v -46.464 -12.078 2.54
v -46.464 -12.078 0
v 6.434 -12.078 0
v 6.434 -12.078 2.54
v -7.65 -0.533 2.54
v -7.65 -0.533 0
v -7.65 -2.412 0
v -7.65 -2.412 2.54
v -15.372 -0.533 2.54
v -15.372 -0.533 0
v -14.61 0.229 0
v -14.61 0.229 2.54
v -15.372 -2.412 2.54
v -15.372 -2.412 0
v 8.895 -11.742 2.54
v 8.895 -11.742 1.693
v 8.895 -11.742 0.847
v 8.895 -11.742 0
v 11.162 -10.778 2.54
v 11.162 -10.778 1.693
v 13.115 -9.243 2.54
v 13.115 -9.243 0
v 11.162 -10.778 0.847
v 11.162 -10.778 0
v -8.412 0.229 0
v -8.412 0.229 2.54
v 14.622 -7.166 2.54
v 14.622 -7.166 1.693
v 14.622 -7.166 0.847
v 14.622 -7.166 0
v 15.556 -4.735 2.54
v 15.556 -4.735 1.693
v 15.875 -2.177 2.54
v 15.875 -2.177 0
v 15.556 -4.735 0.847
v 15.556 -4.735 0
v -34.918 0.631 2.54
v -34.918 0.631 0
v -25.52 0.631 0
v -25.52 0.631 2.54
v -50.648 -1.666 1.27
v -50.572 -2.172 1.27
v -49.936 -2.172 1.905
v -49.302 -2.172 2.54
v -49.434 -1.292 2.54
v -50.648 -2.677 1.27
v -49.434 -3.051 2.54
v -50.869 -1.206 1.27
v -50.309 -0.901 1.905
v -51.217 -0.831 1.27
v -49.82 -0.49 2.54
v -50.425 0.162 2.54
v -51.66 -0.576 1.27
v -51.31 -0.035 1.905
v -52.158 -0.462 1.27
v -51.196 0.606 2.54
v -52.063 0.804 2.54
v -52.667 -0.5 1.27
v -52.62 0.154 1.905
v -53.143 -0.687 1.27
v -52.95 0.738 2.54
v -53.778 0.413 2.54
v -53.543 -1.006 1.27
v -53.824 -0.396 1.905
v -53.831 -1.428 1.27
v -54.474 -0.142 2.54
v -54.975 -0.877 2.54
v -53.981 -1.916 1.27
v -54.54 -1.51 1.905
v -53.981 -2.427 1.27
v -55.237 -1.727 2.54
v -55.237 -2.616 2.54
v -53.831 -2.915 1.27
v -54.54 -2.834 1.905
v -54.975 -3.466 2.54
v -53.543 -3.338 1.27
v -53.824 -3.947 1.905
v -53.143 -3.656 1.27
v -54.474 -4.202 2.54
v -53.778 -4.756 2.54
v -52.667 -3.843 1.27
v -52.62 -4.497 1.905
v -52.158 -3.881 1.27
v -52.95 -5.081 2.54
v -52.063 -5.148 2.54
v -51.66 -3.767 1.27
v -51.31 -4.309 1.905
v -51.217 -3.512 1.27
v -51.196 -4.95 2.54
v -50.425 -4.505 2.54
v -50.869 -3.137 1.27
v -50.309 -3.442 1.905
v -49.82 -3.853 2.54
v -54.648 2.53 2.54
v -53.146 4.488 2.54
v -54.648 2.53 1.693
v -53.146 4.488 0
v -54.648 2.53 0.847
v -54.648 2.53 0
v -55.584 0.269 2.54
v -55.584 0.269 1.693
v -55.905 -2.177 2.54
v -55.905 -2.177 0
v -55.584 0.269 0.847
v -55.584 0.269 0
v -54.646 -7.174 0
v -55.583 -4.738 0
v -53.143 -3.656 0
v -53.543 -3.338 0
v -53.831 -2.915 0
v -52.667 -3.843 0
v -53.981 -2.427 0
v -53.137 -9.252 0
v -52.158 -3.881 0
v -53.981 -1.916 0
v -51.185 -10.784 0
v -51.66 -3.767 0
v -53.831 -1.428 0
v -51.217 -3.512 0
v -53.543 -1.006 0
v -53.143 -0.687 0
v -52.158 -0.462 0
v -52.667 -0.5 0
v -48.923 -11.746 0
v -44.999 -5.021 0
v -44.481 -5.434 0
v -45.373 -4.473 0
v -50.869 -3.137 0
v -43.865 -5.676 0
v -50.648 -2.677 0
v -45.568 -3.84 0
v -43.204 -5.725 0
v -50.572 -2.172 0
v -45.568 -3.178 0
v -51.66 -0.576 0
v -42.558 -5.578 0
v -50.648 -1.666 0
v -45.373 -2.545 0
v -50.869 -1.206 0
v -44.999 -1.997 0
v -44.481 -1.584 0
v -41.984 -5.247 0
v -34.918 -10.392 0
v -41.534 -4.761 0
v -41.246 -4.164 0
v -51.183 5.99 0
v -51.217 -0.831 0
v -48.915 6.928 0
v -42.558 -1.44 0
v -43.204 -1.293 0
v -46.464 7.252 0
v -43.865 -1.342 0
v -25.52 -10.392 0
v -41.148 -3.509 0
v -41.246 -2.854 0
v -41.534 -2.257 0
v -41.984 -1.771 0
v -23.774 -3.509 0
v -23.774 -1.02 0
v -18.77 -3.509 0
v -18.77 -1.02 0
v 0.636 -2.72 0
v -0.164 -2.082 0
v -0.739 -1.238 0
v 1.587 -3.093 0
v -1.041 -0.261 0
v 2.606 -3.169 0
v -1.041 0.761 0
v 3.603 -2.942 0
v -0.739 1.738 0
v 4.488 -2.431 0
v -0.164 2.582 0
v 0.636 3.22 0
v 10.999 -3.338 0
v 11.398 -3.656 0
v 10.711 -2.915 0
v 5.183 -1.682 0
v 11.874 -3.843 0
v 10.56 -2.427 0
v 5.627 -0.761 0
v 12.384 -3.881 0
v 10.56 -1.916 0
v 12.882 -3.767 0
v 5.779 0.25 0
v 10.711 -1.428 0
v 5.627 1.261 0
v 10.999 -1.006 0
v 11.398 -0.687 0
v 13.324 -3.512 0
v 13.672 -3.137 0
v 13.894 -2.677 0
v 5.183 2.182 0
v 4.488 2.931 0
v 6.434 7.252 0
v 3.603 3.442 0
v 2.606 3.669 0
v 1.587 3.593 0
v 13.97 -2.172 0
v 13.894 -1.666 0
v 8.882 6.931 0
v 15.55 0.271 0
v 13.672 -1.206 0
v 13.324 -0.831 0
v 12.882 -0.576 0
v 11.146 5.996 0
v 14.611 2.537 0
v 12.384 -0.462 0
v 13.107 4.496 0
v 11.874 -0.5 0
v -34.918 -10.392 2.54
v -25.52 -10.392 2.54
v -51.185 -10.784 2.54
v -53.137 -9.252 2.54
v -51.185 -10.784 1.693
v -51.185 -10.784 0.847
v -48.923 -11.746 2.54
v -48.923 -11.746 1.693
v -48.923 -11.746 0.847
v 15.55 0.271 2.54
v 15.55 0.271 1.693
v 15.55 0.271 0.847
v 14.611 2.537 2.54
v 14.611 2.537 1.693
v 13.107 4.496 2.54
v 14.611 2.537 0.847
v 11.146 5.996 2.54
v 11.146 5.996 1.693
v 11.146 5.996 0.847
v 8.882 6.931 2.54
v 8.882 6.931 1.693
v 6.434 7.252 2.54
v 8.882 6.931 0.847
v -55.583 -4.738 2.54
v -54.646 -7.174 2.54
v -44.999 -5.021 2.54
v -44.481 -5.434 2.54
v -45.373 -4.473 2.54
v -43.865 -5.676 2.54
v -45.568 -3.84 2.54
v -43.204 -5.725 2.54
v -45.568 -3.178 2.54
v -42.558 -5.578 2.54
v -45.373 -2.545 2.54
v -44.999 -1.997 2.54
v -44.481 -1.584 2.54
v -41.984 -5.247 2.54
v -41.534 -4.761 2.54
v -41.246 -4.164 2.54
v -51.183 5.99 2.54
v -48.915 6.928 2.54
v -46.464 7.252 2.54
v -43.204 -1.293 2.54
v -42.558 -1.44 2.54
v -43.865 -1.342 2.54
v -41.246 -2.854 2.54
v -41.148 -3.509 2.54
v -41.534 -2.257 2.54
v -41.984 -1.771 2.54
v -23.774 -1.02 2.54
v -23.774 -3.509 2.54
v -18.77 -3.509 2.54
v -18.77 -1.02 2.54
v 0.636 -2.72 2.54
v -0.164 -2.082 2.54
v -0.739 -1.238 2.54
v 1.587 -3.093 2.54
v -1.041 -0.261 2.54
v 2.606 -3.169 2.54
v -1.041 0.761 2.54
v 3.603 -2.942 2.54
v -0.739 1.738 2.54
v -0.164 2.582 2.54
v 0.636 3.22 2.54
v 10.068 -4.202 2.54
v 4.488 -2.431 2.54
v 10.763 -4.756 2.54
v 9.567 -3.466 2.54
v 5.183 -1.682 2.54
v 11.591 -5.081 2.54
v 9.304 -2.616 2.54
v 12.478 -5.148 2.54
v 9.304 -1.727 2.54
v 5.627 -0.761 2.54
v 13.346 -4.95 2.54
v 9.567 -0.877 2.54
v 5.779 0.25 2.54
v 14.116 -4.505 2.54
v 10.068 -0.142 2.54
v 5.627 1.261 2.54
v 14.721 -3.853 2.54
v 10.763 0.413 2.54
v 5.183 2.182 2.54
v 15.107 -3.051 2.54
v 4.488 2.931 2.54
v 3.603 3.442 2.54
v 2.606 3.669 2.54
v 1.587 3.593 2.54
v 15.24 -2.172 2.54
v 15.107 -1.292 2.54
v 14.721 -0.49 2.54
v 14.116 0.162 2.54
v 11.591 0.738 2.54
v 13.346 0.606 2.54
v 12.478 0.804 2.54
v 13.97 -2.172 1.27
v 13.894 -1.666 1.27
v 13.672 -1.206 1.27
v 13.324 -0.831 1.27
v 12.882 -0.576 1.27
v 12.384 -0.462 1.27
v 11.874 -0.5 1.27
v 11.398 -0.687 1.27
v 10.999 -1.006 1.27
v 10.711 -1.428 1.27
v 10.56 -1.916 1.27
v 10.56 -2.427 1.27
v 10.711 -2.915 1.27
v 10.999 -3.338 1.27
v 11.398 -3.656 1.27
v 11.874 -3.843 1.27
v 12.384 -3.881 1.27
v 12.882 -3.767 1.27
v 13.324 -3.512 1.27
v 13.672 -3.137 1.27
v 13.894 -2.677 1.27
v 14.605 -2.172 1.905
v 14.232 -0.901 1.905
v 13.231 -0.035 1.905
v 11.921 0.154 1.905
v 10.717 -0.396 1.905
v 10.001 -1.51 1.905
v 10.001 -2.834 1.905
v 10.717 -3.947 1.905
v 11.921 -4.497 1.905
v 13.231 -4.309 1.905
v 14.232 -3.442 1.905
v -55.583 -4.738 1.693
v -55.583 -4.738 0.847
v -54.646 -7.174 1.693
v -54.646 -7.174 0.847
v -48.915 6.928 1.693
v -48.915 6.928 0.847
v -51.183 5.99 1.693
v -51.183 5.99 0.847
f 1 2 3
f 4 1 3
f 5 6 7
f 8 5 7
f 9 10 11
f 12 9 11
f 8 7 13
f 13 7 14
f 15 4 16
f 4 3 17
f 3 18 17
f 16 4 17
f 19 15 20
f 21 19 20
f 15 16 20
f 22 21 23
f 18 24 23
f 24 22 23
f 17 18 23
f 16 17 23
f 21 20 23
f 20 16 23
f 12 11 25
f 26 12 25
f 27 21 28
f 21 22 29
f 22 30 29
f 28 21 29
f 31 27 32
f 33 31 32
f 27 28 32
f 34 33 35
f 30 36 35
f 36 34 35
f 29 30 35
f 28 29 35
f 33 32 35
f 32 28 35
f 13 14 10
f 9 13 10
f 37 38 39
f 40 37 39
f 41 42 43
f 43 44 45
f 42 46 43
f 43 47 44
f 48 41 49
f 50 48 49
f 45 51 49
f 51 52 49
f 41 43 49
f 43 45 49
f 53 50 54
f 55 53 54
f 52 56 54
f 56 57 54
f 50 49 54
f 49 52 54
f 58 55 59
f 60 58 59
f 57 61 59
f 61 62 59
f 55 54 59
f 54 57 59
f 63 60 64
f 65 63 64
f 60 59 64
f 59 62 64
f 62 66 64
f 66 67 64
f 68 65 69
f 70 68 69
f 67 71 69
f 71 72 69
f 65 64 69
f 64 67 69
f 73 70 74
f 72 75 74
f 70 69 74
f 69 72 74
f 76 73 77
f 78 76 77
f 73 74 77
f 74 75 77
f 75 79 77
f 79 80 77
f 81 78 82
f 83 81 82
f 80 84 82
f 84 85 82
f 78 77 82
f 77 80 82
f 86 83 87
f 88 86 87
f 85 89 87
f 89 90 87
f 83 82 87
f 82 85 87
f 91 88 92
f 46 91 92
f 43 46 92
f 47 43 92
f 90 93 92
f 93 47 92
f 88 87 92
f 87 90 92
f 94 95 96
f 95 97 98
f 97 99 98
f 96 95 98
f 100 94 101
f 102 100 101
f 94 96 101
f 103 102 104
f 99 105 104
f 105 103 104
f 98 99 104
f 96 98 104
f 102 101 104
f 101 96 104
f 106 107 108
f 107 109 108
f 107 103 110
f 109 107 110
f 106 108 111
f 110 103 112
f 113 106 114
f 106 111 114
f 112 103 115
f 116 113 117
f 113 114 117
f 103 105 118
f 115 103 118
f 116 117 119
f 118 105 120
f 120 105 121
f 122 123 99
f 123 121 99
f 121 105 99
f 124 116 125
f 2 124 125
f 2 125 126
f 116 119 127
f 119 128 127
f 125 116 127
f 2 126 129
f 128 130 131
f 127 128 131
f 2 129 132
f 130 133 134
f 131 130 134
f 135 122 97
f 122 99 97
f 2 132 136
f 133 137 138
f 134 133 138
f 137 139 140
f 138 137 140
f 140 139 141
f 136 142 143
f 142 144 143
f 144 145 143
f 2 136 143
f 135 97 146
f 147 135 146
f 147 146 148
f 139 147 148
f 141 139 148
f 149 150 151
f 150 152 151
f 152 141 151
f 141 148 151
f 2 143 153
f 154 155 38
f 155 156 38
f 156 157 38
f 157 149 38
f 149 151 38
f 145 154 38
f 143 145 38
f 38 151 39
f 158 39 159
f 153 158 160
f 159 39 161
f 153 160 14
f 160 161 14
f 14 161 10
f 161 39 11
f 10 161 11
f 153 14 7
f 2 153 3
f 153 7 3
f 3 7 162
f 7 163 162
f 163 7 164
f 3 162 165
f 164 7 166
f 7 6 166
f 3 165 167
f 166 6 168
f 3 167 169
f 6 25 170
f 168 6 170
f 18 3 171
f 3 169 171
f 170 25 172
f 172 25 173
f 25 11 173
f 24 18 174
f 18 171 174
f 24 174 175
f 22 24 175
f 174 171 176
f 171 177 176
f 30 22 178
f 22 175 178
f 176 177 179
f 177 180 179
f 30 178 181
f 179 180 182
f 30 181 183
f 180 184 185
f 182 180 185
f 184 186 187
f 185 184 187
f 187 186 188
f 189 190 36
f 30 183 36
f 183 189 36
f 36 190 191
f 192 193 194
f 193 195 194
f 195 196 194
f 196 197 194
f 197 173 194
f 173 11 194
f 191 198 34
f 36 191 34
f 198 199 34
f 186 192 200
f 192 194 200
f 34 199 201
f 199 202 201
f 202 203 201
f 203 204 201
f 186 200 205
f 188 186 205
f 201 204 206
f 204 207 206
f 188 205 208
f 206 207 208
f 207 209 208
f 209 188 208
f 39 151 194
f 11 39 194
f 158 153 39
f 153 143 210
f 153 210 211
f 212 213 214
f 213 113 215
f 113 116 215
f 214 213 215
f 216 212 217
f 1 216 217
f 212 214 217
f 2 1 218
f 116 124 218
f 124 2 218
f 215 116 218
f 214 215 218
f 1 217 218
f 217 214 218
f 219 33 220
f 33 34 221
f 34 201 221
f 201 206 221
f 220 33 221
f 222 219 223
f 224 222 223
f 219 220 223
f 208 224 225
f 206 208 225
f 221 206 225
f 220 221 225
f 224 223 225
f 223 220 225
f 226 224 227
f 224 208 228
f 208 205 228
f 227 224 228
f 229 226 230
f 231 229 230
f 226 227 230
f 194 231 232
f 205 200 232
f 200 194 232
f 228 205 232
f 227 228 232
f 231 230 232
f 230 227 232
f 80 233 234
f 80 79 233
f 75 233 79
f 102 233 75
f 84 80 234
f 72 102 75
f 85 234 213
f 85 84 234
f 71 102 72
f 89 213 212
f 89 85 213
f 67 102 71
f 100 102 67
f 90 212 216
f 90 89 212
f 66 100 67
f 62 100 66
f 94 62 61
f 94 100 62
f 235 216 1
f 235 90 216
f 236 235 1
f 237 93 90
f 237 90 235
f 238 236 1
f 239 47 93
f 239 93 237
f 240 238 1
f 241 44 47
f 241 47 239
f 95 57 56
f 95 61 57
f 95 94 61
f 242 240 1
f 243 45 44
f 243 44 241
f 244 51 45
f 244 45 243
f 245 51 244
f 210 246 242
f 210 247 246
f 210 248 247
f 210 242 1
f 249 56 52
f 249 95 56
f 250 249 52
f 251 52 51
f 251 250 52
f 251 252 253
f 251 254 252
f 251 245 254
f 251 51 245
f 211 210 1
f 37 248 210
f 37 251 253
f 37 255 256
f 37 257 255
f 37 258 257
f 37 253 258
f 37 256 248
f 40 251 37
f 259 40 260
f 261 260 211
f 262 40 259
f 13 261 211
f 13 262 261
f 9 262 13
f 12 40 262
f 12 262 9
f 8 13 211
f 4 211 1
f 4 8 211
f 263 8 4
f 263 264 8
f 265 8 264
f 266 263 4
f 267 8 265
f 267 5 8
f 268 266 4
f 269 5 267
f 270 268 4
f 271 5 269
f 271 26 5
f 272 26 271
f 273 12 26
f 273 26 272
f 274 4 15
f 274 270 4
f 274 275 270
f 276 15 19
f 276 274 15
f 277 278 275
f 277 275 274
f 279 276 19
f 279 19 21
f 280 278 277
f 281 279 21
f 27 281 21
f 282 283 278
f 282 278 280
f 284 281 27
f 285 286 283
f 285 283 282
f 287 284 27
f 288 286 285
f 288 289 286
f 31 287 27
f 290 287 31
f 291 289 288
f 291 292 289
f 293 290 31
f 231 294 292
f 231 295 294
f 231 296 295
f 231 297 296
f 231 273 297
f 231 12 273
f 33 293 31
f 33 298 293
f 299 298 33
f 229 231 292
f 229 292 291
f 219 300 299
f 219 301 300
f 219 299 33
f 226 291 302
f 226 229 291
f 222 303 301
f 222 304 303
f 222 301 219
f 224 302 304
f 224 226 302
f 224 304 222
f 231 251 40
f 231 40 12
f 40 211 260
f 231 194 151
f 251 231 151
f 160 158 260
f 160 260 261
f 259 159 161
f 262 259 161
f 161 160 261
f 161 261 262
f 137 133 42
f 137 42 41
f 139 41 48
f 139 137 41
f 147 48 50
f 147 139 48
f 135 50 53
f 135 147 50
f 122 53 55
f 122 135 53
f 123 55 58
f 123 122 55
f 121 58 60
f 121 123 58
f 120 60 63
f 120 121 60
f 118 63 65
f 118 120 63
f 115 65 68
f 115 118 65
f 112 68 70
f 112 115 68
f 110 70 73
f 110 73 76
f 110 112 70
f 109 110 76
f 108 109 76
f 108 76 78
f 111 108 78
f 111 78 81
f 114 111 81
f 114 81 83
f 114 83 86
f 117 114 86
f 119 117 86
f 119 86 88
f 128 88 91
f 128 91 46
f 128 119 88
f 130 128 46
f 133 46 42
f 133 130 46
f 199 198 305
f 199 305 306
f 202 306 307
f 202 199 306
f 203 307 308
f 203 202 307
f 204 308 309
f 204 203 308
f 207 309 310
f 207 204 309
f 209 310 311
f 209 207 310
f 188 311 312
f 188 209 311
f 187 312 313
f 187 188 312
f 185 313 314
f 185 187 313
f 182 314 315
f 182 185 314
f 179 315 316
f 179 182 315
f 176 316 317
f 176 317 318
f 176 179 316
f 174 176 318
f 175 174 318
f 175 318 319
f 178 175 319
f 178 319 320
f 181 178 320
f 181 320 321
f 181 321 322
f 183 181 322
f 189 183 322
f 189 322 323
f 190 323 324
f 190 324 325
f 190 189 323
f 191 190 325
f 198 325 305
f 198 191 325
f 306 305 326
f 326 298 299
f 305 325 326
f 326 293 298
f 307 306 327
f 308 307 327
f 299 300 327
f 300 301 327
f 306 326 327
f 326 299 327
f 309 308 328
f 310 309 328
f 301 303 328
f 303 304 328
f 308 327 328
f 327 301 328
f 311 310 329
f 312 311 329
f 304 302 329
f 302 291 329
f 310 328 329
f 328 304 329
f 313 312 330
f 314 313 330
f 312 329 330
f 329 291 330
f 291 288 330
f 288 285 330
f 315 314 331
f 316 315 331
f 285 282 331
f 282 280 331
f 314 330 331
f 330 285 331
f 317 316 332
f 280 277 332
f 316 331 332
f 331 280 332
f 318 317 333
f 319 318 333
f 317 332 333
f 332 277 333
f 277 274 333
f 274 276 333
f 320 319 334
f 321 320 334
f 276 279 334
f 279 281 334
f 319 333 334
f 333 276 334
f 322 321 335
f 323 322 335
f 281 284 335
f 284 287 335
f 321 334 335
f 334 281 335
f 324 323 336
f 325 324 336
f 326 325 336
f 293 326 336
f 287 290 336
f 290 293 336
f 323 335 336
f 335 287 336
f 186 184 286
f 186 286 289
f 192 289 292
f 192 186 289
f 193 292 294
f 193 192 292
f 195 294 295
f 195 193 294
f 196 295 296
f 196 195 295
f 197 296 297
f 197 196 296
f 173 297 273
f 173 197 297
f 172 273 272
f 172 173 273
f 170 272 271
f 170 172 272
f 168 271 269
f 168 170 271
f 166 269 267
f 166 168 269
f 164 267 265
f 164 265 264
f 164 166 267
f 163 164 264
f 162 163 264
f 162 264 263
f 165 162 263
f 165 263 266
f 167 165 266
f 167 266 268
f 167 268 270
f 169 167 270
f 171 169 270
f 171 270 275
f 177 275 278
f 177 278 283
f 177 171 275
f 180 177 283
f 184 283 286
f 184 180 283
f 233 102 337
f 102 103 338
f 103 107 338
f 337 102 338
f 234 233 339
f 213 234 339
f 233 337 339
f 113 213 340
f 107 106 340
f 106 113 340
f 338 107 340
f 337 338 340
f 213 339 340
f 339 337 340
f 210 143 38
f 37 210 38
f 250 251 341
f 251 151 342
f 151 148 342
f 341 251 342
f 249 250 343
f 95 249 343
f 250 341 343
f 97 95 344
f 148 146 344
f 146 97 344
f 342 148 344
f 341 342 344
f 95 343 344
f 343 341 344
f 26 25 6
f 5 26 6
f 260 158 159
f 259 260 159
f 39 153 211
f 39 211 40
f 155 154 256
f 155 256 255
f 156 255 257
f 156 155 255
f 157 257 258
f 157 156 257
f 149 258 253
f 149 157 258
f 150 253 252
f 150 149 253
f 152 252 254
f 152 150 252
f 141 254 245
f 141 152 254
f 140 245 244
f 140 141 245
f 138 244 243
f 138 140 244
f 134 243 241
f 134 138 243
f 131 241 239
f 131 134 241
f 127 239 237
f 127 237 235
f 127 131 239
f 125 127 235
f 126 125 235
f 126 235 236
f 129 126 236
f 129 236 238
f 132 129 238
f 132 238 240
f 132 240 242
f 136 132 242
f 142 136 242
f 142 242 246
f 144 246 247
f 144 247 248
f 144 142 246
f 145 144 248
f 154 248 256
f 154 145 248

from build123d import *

# Parameters (mm, degrees)
SKETCH1_R           = 3.4289
SKETCH1_R_2         = 1.7144
SKETCH1_R_3         = 2.2226
SKETCH1_W           = 9.398
SKETCH1_H           = 11.0235
SKETCH1_W_2         = 5.0037
SKETCH1_H_2         = 2.4891
BOSS_EXTRUDE1_DEPTH = 2.54
CHAMFER1_SIZE       = 1.27


with BuildPart() as part:
    # Sketch1 → Boss-Extrude1 (new body)
    with BuildSketch(Plane.XY):
        with BuildLine():
            Line((6.434, 7.2517), (-46.4644, 7.2517))
            add(Edge.make_bspline(
                [(-46.4644, 7.2517), (-48.9654, 7.2501), (-51.3771, 6.2567), (-53.1462, 4.4876)],
                knots=[0.3, 0.3, 0.3, 0.3, 0.4, 0.4, 0.4, 0.4], degree=3))
            add(Edge.make_bspline(
                [(-53.1462, 4.4876), (-54.9139, 2.7201), (-55.907, 0.3228), (-55.9054, -2.1769)],
                knots=[0.4, 0.4, 0.4, 0.4, 0.5, 0.5, 0.5, 0.5], degree=3))
            add(Edge.make_bspline(
                [(-55.9054, -2.1769), (-55.9039, -4.7242), (-54.9188, -7.4291), (-53.137, -9.2518)],
                knots=[0.5, 0.5, 0.5, 0.5, 0.6, 0.6, 0.6, 0.6], degree=3))
            add(Edge.make_bspline(
                [(-53.137, -9.2518), (-51.3786, -11.0507), (-48.9824, -12.0793), (-46.4644, -12.0777)],
                knots=[0.6, 0.6, 0.6, 0.6, 0.7, 0.7, 0.7, 0.7], degree=3))
            Line((-46.4644, -12.0777), (6.434, -12.0777))
            add(Edge.make_bspline(
                [(6.434, -12.0777), (8.9516, -12.0761), (11.3581, -11.0449), (13.1151, -9.2429)],
                knots=[0.8, 0.8, 0.8, 0.8, 0.9, 0.9, 0.9, 0.9], degree=3))
            add(Edge.make_bspline(
                [(13.1151, -9.2429), (14.8954, -7.4173), (15.8766, -4.7239), (15.875, -2.1771)],
                knots=[0.9, 0.9, 0.9, 0.9, 1, 1, 1, 1], degree=3))
            add(Edge.make_bspline(
                [(15.875, -2.1771), (15.8735, 0.3223), (14.8775, 2.7305), (13.1074, 4.496)],
                knots=[0, 0, 0, 0, 0.1, 0.1, 0.1, 0.1], degree=3))
            add(Edge.make_bspline(
                [(13.1074, 4.496), (11.3364, 6.2625), (8.9354, 7.2533), (6.434, 7.2517)],
                knots=[0.1, 0.1, 0.1, 0.1, 0.2, 0.2, 0.2, 0.2], degree=3))
        make_face()
        with Locations((2.35, 0.25)):
            Circle(SKETCH1_R, mode=Mode.SUBTRACT)
        with Locations((12.2554, -2.1716)):
            Circle(SKETCH1_R_2, mode=Mode.SUBTRACT)
        with Locations((-43.3701, -3.5091)):
            Circle(SKETCH1_R_3, mode=Mode.SUBTRACT)
        with Locations((-52.2859, -2.1716)):
            Circle(SKETCH1_R_2, mode=Mode.SUBTRACT)
        with Locations((-30.2191, -4.88075)):
            Rectangle(SKETCH1_W, SKETCH1_H, mode=Mode.SUBTRACT)
        Polygon((-15.3715, -0.5328), (-14.6095, 0.2292), (-8.4119, 0.2292), (-7.6499, -0.5328), (-7.6499, -2.4124), (-15.3715, -2.4124), align=None, mode=Mode.SUBTRACT)
        with Locations((-21.27195, -2.26465)):
            Rectangle(SKETCH1_W_2, SKETCH1_H_2, mode=Mode.SUBTRACT)
    extrude(amount=BOSS_EXTRUDE1_DEPTH)

    # Chamfer1
    chamfer1_edges = [part.edges().sort_by_distance(p)[0] for p in [
        (10.541, -2.1716, 2.54),
        (-54.0003, -2.1716, 2.54),
    ]]
    chamfer(chamfer1_edges, length=CHAMFER1_SIZE)


solid = part.part
